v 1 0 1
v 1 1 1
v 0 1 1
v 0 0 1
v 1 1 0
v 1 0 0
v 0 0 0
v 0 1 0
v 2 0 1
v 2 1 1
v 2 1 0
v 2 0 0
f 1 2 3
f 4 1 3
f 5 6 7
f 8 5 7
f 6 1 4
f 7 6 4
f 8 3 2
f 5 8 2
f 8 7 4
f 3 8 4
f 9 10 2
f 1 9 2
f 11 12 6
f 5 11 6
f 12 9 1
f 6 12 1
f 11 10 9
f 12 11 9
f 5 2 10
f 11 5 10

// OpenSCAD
//
// Attempt at gluing together two open-face cubes with a small gap.
// Not repairable.
//

e=1e-6;

polyhedron(
  points=[
    [0, 0, 0],
    [1-e, 0, 0],
    [0, 1, 0],
    [1-e, 1, 0],
    [0, 0, 1],
    [1-e, 0, 1],
    [0, 1, 1],
    [1-e, 1, 1],

    [1+e, 0, 0],
    [2, 0, 0],
    [1+e, 1, 0],
    [2, 1, 0],
    [1+e, 0, 1],
    [2, 0, 1],
    [1+e, 1, 1],
    [2, 1, 1],
  ],
  faces=[
    [6,7,5],[6,5,4],
    [0,1,3],[0,3,2],
    [4,5,1],[4,1,0],
    [7,6,2],[7,2,3],
    [4,0,2],[4,2,6],
    [14,15,13],[14,13,12],
    [8,9,11],[8,11,10],
    [12,13,9],[12,9,8],
    [13,15,11],[13,11,9],
    [15,14,10],[15,10,11],
  ]);
